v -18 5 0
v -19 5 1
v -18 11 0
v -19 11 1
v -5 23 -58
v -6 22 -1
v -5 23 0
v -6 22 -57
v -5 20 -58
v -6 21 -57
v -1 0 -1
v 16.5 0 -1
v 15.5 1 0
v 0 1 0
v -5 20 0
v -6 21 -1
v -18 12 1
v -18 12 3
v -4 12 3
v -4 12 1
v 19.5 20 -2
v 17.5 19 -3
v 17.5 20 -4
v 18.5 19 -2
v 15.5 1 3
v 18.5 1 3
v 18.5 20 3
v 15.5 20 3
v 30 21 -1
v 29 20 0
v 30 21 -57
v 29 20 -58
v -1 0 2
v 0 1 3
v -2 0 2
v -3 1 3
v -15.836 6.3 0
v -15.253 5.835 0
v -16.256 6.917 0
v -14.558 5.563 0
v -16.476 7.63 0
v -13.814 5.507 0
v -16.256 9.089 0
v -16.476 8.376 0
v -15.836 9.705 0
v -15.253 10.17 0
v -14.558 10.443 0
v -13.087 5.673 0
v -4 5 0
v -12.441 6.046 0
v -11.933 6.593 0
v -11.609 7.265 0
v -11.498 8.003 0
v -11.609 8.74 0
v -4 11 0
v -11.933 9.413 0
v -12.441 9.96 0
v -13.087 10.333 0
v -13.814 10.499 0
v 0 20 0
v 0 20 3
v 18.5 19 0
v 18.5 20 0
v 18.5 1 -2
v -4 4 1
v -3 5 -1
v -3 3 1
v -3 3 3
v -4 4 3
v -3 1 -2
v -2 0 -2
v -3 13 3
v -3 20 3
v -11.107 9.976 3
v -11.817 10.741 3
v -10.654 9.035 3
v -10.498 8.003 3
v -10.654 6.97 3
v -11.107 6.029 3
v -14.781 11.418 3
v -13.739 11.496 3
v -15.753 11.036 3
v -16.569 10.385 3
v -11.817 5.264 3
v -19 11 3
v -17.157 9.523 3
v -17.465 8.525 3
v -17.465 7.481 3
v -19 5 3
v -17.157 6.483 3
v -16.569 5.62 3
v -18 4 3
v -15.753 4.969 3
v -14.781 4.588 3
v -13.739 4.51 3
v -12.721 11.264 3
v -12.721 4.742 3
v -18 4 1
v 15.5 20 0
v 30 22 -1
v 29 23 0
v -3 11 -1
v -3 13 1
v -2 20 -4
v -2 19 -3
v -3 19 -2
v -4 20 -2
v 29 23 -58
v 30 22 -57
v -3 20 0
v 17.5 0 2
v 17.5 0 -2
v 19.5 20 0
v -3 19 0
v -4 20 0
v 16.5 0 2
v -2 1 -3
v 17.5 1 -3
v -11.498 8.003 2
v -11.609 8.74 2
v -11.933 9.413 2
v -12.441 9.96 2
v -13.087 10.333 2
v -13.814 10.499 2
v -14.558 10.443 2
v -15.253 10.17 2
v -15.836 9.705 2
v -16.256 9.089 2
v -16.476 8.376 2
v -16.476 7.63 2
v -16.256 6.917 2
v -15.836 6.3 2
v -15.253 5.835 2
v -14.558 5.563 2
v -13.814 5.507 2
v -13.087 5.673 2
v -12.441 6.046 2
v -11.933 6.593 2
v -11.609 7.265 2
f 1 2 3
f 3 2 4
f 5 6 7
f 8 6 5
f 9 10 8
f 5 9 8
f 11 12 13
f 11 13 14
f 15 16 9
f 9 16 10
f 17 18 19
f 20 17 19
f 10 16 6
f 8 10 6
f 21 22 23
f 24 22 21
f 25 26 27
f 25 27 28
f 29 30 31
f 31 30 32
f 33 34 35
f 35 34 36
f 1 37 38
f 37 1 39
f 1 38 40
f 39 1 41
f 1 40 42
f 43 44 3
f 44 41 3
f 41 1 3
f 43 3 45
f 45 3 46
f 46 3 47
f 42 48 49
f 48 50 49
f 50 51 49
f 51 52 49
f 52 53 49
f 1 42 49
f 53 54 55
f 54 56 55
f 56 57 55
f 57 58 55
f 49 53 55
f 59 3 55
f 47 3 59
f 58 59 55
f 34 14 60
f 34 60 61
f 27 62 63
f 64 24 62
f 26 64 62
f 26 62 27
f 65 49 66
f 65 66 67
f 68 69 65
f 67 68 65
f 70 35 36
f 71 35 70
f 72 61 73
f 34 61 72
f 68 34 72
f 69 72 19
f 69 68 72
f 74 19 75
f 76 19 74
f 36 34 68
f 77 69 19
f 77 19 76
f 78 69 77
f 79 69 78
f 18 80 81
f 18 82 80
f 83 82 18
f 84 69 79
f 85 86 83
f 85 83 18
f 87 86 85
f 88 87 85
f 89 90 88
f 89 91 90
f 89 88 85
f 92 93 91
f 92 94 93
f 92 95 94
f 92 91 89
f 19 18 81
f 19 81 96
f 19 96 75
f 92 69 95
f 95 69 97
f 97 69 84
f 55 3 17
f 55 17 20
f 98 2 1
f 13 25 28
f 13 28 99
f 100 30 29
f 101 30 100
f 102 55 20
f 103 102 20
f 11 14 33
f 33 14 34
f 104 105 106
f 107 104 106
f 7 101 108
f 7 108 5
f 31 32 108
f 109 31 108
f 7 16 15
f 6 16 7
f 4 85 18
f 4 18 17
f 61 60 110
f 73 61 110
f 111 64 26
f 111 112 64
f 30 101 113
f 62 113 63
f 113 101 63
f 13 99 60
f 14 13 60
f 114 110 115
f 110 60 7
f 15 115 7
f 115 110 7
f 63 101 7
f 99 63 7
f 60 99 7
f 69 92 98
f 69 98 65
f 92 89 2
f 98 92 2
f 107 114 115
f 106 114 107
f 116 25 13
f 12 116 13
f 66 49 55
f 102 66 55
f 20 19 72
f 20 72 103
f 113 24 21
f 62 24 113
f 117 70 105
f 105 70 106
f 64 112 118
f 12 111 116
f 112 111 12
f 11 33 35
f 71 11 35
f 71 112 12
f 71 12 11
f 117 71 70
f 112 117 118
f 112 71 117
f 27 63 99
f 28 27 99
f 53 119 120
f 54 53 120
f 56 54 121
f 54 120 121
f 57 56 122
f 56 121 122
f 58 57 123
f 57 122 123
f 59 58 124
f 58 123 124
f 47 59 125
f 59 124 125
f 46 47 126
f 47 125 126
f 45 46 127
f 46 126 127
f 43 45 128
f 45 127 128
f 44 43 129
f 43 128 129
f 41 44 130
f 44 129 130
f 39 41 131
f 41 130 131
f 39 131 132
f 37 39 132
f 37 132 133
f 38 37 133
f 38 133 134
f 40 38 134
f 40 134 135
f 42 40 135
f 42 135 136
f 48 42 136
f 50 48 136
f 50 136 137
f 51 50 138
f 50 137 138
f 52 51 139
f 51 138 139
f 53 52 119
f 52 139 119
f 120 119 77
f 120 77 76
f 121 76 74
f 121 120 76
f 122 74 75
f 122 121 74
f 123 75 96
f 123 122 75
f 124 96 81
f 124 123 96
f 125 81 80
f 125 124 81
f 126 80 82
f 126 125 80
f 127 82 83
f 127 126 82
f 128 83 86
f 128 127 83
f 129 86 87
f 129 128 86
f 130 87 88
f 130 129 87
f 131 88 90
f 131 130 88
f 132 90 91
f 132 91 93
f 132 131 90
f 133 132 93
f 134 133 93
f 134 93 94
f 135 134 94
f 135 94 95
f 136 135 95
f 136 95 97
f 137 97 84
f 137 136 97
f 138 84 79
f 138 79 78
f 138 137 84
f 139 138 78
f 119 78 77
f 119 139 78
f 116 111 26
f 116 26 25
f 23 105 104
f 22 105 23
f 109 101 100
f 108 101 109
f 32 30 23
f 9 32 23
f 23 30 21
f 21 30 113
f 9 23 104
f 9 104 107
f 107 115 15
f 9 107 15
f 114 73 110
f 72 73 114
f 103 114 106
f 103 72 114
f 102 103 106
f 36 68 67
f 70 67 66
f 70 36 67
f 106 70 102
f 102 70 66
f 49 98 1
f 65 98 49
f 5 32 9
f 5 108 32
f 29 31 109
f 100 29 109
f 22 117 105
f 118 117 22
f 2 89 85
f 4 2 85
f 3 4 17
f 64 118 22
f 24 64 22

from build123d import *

# Parameters (mm, degrees)
EXTRUDE_1_DEPTH = 20
SKETCH_2_W      = 16
SKETCH_2_H      = 8
SKETCH_2_R      = 2.502951076
EXTRUDE_2_DEPTH = 3
EXTRUDE_START   = -3
SKETCH_3_W      = 36
SKETCH_3_H      = 3
EXTRUDE_3_DEPTH = 58
CHAMFER_1_SIZE  = 1


with BuildPart() as part:
    # 草图1 → 凸台-拉伸1 (new body)
    with BuildSketch(Plane(origin=(0, 0, 0), x_dir=(1, 0, 0), z_dir=(0, 1, 0))):
        Polygon((-3, 3), (18.5, 3), (18.5, -3), (15.5, -3), (15.5, 0), (0, 0), (0, -3), (-3, -3), align=None)
    extrude(amount=EXTRUDE_1_DEPTH)

    # 草图2 → 凸台-拉伸2 (add)
    with BuildSketch(Plane.XY.offset(3)):
        with Locations((-11, 8)):
            Rectangle(SKETCH_2_W, SKETCH_2_H)
        with Locations((-14.001123559, 8.002728821)):
            Circle(SKETCH_2_R, mode=Mode.SUBTRACT)
    extrude(amount=-EXTRUDE_2_DEPTH)

    # 草图3 → 凸台-拉伸3 (add)
    with BuildSketch(Plane(origin=(0, 0, -3), x_dir=(-1, 0, 0), z_dir=(0, 0, -1)).offset(EXTRUDE_START)):
        with Locations((-12, 21.5)):
            Rectangle(SKETCH_3_W, SKETCH_3_H)
    extrude(amount=EXTRUDE_3_DEPTH)

    # 倒角1
    chamfer_1_edges = [part.edges().sort_by_distance(p)[0] for p in [
        (30, 23, -29),
        (30, 21.5, -58),
        (30, 20, -29),
        (30, 21.5, 0),
        (-6, 20, -29),
        (-6, 21.5, -58),
        (-6, 23, -29),
        (-6, 21.5, 0),
        (-16.504074634, 8.002728821, 3),
        (-3, 4, 1.5),
        (-3, 12, 1.5),
        (-19, 12, 1.5),
        (-19, 4, 1.5),
        (-19, 8, 0),
        (-11, 4, 0),
        (-11, 12, 0),
        (-3, 8, 0),
        (-3, 20, -1.5),
        (18.5, 20, -1.5),
        (7.75, 0, 0),
        (15.5, 0, 1.5),
        (17, 0, 3),
        (18.5, 0, 0),
        (7.75, 0, -3),
        (0, 0, 1.5),
        (-1.5, 0, 3),
        (-3, 0, 0),
        (-3, 10, -3),
        (18.5, 10, -3),
        (7.75, 20, -3),
    ]]
    chamfer(chamfer_1_edges, length=CHAMFER_1_SIZE)


solid = part.part
